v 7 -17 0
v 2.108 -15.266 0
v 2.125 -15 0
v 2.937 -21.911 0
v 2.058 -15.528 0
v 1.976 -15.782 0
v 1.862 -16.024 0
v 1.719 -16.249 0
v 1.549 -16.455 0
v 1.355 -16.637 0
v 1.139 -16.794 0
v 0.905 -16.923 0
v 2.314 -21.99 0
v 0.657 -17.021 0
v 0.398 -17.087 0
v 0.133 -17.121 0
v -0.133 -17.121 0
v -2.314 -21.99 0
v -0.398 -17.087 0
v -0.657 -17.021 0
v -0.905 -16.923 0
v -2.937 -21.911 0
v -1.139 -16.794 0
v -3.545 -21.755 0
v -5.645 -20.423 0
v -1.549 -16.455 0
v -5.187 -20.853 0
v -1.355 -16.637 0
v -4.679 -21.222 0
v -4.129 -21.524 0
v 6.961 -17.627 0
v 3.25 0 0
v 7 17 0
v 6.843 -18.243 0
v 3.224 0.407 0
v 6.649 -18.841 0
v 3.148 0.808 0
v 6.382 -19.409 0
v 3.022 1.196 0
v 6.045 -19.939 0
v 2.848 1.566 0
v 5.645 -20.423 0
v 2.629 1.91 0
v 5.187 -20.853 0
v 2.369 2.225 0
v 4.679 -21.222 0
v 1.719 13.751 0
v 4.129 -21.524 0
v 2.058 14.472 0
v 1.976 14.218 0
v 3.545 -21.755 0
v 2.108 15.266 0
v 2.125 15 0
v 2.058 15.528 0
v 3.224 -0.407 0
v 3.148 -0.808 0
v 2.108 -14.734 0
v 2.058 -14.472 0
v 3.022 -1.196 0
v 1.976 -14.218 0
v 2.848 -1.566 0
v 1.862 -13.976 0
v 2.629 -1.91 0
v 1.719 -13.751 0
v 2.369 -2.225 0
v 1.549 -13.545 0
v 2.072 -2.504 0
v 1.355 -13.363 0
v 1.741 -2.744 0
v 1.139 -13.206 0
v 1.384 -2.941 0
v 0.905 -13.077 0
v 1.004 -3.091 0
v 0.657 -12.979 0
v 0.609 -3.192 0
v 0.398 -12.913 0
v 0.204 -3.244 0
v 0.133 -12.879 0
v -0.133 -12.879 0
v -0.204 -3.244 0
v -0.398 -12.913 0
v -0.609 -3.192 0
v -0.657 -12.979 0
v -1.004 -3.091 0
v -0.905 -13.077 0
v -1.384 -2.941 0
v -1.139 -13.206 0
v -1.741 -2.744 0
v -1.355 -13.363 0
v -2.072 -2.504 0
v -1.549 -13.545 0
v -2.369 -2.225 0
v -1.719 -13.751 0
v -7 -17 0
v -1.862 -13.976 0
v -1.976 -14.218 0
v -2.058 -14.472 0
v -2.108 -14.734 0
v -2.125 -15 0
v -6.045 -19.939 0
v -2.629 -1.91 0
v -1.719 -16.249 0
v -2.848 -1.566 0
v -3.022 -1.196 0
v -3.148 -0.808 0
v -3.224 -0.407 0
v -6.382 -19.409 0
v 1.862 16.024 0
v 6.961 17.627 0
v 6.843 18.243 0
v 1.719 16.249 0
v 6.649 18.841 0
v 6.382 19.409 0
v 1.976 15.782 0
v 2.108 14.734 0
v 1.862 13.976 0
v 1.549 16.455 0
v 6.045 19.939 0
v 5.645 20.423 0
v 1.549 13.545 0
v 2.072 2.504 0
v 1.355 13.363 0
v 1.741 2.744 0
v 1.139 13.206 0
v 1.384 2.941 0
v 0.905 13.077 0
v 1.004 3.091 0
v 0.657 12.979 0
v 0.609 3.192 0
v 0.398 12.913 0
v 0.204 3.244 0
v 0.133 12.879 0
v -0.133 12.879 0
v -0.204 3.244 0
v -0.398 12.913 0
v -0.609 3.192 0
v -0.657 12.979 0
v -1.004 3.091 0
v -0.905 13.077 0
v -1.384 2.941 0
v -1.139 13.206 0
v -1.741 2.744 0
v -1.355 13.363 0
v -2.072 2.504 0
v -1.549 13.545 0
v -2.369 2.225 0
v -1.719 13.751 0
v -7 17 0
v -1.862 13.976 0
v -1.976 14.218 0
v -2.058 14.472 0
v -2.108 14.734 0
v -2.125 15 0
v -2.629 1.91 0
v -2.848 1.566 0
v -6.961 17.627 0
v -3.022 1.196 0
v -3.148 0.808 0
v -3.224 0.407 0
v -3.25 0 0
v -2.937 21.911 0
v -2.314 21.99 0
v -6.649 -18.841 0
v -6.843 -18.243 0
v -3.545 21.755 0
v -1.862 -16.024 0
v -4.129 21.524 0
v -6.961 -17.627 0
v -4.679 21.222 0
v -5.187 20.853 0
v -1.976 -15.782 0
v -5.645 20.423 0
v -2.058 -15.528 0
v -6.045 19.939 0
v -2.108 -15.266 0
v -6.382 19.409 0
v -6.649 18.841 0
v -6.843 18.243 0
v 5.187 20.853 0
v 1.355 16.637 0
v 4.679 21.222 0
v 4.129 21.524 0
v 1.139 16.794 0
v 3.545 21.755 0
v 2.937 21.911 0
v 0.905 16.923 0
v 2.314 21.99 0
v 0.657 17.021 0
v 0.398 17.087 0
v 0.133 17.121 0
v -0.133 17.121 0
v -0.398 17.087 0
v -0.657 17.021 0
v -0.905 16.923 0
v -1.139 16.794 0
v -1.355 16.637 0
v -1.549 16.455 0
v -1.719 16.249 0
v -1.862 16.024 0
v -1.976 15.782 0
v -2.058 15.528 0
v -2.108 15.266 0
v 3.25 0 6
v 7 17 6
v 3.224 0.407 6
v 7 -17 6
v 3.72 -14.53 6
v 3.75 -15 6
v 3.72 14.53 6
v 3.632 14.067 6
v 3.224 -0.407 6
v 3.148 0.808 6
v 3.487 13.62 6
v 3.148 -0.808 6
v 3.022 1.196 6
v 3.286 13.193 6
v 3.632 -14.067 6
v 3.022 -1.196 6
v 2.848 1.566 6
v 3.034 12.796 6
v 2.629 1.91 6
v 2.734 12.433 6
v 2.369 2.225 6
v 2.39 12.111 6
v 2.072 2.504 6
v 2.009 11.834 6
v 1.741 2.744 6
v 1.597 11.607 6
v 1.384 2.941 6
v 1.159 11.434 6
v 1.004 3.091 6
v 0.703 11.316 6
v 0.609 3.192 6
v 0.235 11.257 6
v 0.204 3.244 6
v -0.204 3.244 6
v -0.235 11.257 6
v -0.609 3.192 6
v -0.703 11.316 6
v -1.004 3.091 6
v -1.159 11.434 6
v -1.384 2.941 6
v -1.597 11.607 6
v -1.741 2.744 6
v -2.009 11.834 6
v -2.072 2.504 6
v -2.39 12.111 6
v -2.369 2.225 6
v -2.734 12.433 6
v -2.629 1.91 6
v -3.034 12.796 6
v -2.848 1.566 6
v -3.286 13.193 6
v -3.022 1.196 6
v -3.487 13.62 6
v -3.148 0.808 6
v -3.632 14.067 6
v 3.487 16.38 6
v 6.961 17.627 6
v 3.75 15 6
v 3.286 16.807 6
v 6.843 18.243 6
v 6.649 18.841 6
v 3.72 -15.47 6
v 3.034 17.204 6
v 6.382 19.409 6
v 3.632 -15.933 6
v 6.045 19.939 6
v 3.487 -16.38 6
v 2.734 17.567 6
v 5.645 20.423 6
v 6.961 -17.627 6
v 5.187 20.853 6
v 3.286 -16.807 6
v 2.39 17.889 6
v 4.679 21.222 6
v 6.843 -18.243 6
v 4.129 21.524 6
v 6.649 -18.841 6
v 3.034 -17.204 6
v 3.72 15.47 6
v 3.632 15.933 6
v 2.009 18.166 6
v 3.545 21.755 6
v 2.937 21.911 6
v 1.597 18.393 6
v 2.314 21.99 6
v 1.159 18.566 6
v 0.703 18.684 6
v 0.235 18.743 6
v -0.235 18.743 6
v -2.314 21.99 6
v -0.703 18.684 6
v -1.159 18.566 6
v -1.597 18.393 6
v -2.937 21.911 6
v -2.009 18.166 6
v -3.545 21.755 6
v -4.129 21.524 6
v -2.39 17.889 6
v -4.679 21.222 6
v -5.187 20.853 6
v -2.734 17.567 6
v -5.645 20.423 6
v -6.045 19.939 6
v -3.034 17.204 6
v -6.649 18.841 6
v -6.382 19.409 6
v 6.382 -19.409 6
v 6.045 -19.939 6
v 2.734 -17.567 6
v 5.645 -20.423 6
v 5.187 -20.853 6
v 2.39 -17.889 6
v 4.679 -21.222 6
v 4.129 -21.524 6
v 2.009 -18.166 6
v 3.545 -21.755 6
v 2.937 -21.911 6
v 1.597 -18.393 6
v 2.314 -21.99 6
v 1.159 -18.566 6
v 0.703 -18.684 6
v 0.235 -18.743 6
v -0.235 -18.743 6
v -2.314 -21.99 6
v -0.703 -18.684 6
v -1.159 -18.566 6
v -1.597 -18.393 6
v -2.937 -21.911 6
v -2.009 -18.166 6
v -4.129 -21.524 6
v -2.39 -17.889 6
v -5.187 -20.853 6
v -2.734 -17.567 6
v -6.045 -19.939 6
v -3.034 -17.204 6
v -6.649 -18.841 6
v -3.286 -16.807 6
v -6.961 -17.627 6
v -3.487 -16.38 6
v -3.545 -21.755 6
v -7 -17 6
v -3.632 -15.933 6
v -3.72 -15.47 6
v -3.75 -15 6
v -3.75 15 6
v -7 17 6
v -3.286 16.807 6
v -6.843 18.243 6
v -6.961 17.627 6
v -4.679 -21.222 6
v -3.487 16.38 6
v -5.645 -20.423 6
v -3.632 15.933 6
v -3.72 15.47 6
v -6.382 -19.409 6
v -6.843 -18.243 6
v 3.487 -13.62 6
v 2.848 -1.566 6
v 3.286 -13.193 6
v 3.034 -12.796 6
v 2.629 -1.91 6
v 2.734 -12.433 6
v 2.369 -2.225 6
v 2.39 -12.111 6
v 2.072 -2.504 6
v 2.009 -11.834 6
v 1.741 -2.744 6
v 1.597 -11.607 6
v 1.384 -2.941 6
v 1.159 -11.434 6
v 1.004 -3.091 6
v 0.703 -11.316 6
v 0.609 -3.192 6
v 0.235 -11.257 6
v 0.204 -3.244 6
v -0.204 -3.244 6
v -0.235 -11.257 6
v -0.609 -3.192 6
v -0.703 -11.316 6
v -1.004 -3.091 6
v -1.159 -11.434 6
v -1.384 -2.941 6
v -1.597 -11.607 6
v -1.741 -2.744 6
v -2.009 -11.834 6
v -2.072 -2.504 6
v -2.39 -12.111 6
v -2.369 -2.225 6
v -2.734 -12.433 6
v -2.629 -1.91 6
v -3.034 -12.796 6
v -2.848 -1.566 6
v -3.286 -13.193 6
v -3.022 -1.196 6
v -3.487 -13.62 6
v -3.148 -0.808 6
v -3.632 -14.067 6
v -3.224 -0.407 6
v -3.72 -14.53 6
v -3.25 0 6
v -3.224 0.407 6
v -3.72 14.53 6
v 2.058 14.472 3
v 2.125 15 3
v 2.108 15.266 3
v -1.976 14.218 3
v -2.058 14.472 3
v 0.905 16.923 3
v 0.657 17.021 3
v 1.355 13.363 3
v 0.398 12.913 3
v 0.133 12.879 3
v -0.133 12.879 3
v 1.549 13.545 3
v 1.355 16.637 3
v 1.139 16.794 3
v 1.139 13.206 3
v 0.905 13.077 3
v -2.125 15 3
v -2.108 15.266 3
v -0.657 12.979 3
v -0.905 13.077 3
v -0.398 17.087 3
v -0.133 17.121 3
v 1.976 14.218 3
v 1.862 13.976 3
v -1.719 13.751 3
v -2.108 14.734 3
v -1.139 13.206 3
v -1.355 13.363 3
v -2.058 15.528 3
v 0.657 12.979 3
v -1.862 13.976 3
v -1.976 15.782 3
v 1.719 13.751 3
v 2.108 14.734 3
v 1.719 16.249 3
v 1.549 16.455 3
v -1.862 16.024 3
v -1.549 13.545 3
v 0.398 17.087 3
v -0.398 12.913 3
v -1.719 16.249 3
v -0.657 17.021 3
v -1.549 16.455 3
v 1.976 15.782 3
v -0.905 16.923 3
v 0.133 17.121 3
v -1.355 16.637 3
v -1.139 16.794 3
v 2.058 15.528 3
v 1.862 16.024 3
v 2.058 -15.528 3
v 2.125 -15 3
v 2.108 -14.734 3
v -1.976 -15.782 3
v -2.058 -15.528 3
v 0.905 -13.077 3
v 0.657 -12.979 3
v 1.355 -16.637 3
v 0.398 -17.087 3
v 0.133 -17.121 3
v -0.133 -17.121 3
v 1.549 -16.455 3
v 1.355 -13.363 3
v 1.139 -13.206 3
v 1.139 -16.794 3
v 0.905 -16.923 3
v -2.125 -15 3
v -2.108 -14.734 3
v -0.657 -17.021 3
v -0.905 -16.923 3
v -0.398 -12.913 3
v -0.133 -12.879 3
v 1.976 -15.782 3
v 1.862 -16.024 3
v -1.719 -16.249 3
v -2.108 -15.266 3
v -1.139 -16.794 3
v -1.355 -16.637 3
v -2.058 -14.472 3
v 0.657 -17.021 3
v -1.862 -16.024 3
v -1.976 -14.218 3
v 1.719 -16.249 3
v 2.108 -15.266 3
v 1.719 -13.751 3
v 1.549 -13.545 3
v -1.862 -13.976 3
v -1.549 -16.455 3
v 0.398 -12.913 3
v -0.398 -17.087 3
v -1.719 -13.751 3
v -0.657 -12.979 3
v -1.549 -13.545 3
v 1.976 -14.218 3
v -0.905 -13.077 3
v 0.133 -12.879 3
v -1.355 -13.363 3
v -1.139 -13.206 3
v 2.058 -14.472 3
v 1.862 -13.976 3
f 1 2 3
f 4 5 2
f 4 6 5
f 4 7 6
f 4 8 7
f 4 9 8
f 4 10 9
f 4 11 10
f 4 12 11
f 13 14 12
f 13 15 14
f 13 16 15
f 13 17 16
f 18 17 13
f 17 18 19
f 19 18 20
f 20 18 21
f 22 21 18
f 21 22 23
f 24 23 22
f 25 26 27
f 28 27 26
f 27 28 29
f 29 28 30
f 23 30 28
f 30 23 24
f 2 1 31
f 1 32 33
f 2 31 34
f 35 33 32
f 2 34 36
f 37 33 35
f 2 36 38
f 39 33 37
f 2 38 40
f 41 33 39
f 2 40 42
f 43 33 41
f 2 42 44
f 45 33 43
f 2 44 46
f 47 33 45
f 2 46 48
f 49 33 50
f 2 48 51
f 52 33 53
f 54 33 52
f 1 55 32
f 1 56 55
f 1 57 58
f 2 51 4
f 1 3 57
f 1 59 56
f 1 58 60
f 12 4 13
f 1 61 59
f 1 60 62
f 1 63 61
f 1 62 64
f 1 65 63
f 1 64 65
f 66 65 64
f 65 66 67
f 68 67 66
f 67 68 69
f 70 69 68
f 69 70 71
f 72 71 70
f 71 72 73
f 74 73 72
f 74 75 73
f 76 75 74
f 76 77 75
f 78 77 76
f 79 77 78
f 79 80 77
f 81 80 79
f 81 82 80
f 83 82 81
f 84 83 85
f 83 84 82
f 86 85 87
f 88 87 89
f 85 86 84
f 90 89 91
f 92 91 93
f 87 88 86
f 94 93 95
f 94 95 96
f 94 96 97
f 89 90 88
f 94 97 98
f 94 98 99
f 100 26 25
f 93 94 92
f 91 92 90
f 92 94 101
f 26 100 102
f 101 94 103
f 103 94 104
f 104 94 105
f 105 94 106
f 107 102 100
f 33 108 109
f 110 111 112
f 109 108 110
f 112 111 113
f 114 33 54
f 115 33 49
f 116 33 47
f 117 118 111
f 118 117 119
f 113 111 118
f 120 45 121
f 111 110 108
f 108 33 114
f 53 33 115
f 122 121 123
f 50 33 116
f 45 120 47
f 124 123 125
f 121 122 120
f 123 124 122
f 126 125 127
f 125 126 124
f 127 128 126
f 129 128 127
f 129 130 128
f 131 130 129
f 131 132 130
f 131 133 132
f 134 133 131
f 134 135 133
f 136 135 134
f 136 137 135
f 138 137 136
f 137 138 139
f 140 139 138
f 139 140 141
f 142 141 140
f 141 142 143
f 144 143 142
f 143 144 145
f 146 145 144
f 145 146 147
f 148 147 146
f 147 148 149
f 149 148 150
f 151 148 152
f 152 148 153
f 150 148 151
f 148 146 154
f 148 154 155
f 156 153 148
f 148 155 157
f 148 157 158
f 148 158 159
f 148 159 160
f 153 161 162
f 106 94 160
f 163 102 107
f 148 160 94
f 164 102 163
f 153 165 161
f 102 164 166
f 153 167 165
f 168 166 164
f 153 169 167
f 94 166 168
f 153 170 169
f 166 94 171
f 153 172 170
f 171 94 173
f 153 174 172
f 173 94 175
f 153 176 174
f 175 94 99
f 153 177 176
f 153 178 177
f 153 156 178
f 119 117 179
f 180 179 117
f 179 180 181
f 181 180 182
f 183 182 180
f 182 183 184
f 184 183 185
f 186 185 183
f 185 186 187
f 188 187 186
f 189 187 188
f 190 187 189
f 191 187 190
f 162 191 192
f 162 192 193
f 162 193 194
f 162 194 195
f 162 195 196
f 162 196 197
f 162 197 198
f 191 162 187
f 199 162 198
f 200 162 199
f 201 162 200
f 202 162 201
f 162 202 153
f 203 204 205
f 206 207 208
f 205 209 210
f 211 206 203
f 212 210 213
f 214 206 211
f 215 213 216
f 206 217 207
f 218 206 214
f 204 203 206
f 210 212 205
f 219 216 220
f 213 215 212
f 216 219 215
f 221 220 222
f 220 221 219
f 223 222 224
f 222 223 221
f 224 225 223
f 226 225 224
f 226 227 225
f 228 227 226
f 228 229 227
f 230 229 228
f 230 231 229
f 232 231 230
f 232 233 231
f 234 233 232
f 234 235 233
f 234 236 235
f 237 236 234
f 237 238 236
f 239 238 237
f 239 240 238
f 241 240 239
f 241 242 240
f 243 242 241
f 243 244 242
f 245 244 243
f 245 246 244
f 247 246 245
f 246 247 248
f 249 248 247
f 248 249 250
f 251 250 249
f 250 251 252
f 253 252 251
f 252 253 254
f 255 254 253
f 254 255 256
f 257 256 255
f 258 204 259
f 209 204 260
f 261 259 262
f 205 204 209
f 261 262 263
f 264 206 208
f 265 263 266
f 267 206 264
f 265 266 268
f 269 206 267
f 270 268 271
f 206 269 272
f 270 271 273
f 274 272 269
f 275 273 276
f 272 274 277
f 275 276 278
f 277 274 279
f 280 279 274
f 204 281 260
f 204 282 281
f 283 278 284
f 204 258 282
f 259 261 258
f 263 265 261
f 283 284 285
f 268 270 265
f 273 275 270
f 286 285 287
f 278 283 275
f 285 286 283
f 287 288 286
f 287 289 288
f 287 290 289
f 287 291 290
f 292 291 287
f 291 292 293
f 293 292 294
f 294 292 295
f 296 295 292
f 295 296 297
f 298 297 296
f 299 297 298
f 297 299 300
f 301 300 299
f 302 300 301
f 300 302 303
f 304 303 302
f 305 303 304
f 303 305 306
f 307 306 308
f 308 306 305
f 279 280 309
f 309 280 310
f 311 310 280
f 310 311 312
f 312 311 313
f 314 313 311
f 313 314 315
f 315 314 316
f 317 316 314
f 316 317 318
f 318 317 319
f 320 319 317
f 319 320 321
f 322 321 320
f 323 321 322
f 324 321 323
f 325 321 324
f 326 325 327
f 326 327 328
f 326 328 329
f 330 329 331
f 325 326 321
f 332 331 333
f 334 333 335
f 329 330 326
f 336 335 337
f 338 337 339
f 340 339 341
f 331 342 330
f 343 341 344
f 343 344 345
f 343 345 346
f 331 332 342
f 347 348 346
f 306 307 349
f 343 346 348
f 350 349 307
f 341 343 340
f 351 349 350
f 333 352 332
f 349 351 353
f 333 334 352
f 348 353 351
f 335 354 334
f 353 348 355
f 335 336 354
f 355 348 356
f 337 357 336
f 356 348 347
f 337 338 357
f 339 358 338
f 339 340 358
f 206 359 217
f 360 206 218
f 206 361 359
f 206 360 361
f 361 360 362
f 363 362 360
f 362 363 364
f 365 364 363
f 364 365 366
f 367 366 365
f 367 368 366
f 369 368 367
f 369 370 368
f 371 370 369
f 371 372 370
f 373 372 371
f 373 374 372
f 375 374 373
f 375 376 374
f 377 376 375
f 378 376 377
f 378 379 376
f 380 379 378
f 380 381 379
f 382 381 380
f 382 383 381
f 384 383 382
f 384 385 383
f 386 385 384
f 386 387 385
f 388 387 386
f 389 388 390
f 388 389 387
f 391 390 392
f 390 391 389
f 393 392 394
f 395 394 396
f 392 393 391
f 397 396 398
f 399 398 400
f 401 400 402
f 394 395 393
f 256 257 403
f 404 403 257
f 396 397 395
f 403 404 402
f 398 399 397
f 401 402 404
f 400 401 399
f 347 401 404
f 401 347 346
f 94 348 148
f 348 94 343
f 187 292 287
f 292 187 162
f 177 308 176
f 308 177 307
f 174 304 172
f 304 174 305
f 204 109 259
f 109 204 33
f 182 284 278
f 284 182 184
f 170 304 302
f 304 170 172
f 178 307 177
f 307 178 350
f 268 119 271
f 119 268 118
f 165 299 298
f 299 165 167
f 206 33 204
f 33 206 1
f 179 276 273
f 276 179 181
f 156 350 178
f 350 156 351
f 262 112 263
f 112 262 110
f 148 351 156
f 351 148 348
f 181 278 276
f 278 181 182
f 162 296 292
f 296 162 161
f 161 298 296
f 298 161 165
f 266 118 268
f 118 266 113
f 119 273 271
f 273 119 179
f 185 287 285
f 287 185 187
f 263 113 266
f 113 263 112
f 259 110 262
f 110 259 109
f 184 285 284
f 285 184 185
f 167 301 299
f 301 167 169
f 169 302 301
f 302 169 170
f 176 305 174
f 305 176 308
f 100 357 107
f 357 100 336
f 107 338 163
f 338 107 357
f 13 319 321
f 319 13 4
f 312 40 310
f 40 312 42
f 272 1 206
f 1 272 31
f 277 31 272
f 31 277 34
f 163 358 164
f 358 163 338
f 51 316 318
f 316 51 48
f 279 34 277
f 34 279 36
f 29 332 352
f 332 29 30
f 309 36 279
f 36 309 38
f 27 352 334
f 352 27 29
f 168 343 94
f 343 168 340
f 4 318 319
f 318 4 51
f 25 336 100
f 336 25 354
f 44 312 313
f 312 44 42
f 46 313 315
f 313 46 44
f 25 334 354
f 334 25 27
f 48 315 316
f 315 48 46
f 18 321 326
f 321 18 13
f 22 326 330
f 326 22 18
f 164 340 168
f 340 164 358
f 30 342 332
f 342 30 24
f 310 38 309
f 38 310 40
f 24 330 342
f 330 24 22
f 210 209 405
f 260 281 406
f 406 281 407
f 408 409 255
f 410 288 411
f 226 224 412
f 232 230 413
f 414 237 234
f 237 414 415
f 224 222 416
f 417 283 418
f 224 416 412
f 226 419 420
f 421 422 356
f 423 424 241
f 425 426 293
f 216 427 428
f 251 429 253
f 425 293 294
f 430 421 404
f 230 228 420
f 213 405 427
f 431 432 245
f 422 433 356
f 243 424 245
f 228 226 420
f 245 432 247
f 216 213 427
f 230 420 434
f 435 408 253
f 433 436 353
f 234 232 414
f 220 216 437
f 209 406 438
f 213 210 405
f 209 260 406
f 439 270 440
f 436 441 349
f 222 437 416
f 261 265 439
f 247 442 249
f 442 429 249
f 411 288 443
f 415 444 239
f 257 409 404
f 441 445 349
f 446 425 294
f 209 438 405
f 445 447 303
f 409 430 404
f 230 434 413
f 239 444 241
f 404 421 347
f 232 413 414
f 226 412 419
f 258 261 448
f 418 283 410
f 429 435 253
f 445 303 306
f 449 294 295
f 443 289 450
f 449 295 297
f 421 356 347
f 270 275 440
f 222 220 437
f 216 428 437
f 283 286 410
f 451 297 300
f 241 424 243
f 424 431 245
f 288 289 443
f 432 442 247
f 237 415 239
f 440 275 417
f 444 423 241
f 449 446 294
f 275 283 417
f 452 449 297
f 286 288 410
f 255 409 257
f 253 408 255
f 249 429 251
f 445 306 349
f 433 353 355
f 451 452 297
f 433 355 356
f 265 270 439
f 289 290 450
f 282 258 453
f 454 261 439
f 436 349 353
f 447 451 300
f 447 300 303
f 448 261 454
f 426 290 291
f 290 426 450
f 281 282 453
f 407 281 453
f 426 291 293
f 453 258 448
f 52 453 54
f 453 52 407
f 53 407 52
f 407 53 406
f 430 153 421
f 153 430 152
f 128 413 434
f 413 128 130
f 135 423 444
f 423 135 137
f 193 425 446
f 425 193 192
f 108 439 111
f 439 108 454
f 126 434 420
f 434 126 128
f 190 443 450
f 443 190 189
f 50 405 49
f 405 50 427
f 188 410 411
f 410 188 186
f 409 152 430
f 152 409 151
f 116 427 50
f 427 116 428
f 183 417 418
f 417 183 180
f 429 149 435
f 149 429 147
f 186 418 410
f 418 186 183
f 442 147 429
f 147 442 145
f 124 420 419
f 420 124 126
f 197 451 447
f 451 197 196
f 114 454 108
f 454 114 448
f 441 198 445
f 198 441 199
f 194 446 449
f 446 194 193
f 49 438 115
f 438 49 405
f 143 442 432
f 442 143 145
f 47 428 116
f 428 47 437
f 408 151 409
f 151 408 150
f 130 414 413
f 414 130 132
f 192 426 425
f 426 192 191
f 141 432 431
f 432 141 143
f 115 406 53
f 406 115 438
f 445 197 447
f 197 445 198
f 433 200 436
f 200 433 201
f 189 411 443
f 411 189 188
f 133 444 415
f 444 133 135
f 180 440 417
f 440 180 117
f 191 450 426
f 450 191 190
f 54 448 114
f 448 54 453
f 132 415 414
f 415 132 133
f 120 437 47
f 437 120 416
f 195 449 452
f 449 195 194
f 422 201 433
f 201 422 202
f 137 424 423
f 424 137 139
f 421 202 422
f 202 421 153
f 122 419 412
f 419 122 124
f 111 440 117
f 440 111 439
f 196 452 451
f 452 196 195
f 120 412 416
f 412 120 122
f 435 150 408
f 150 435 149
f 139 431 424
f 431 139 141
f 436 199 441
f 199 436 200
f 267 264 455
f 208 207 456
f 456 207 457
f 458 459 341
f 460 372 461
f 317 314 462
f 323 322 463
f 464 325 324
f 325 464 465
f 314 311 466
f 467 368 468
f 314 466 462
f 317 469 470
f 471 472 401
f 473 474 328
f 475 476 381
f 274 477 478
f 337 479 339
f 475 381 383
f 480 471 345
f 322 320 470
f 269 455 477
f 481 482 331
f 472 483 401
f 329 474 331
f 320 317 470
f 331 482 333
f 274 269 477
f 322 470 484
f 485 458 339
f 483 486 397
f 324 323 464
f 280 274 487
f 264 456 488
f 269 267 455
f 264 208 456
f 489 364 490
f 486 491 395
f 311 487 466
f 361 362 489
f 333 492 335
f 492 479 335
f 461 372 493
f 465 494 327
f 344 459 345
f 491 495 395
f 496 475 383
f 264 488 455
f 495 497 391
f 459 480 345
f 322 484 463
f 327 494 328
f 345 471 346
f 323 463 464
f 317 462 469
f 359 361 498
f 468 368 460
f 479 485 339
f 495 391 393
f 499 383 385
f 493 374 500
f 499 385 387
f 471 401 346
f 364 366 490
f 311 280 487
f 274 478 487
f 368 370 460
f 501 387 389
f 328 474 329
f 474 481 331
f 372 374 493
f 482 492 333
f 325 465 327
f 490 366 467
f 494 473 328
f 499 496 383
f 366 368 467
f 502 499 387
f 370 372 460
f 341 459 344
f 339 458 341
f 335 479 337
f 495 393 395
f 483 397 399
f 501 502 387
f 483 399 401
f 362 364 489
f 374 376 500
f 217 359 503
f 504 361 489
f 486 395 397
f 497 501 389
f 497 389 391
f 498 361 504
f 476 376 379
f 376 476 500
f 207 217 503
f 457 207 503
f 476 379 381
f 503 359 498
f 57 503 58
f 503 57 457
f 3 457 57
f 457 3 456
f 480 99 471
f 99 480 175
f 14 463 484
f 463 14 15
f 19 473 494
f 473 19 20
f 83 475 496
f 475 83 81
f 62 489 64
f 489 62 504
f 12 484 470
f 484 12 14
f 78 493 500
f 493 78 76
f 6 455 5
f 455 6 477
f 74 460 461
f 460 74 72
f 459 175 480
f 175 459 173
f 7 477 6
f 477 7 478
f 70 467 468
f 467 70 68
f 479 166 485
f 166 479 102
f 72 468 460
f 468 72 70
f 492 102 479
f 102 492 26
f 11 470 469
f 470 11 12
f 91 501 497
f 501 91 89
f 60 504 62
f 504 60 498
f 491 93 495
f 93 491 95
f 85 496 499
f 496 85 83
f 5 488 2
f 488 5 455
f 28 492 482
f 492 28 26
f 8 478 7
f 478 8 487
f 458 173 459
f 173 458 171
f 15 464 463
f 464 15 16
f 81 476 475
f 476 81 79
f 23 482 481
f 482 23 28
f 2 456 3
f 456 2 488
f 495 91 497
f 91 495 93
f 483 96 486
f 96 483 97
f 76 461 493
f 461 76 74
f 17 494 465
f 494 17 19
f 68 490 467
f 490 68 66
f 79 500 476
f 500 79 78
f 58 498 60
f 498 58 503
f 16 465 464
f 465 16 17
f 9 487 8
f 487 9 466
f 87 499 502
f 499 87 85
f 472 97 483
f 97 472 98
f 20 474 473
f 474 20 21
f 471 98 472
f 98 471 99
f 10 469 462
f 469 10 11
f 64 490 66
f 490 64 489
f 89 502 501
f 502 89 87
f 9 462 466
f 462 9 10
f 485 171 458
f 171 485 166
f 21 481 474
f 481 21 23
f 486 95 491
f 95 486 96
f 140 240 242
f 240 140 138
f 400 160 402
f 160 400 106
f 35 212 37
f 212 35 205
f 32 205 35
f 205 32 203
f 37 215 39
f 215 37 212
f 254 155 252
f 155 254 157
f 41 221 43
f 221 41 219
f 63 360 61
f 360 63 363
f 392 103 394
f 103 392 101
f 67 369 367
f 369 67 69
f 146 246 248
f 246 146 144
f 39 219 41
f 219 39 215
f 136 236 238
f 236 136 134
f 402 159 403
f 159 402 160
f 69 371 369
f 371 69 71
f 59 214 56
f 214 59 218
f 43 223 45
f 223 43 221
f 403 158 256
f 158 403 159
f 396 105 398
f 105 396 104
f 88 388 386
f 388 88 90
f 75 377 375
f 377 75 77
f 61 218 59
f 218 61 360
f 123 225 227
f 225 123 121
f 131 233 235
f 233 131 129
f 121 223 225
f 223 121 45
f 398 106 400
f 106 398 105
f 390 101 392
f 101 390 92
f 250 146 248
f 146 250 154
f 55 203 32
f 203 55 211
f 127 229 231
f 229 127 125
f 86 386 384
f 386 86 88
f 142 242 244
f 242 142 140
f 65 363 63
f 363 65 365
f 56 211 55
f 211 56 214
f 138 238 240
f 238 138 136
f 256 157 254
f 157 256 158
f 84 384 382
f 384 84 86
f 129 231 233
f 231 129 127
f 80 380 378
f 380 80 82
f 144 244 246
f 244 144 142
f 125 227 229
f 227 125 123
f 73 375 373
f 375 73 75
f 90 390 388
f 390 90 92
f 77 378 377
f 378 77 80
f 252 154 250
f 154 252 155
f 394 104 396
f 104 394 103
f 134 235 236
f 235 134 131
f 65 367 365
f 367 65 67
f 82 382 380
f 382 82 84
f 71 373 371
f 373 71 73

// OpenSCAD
$fn = 50;


difference() {
	union() {
		cylinder(h = 6, r = 7.0000000000);
		translate(v = [0.0000000000, 7.5000000000, 0]) {
			hull() {
				translate(v = [-2.0000000000, 9.5000000000, 0]) {
					cylinder(h = 6, r = 5);
				}
				translate(v = [2.0000000000, 9.5000000000, 0]) {
					cylinder(h = 6, r = 5);
				}
				translate(v = [-2.0000000000, -9.5000000000, 0]) {
					cylinder(h = 6, r = 5);
				}
				translate(v = [2.0000000000, -9.5000000000, 0]) {
					cylinder(h = 6, r = 5);
				}
			}
		}
		translate(v = [0.0000000000, 7.5000000000, 0]) {
			hull() {
				translate(v = [-2.0000000000, 9.5000000000, 0]) {
					cylinder(h = 6, r = 5);
				}
				translate(v = [2.0000000000, 9.5000000000, 0]) {
					cylinder(h = 6, r = 5);
				}
				translate(v = [-2.0000000000, -9.5000000000, 0]) {
					cylinder(h = 6, r = 5);
				}
				translate(v = [2.0000000000, -9.5000000000, 0]) {
					cylinder(h = 6, r = 5);
				}
			}
		}
		translate(v = [0.0000000000, -7.5000000000, 0]) {
			hull() {
				translate(v = [-2.0000000000, 9.5000000000, 0]) {
					cylinder(h = 6, r = 5);
				}
				translate(v = [2.0000000000, 9.5000000000, 0]) {
					cylinder(h = 6, r = 5);
				}
				translate(v = [-2.0000000000, -9.5000000000, 0]) {
					cylinder(h = 6, r = 5);
				}
				translate(v = [2.0000000000, -9.5000000000, 0]) {
					cylinder(h = 6, r = 5);
				}
			}
		}
		translate(v = [0.0000000000, -7.5000000000, 0]) {
			hull() {
				translate(v = [-2.0000000000, 9.5000000000, 0]) {
					cylinder(h = 6, r = 5);
				}
				translate(v = [2.0000000000, 9.5000000000, 0]) {
					cylinder(h = 6, r = 5);
				}
				translate(v = [-2.0000000000, -9.5000000000, 0]) {
					cylinder(h = 6, r = 5);
				}
				translate(v = [2.0000000000, -9.5000000000, 0]) {
					cylinder(h = 6, r = 5);
				}
			}
		}
	}
	union() {
		translate(v = [0.0000000000, 15.0000000000, 6]) {
			rotate(a = [0, 0, 0]) {
				difference() {
					union() {
						#translate(v = [0, 0, -6.0000000000]) {
							cylinder(h = 6, r = 2.0000000000);
						}
						#translate(v = [0, 0, -3]) {
							cylinder(h = 3, r1 = 2.1250000000, r2 = 3.7500000000);
						}
						#translate(v = [0, 0, -6.0000000000]) {
							cylinder(h = 6, r = 2.1250000000);
						}
						#translate(v = [0, 0, -6.0000000000]) {
							cylinder(h = 6, r = 2.0000000000);
						}
					}
					union();
				}
			}
		}
		translate(v = [0.0000000000, 15.0000000000, 6]) {
			rotate(a = [0, 0, 0]) {
				difference() {
					union() {
						#translate(v = [0, 0, -6.0000000000]) {
							cylinder(h = 6, r = 2.0000000000);
						}
						#translate(v = [0, 0, -3]) {
							cylinder(h = 3, r1 = 2.1250000000, r2 = 3.7500000000);
						}
						#translate(v = [0, 0, -6.0000000000]) {
							cylinder(h = 6, r = 2.1250000000);
						}
						#translate(v = [0, 0, -6.0000000000]) {
							cylinder(h = 6, r = 2.0000000000);
						}
					}
					union();
				}
			}
		}
		translate(v = [0.0000000000, -15.0000000000, 6]) {
			rotate(a = [0, 0, 0]) {
				difference() {
					union() {
						#translate(v = [0, 0, -6.0000000000]) {
							cylinder(h = 6, r = 2.0000000000);
						}
						#translate(v = [0, 0, -3]) {
							cylinder(h = 3, r1 = 2.1250000000, r2 = 3.7500000000);
						}
						#translate(v = [0, 0, -6.0000000000]) {
							cylinder(h = 6, r = 2.1250000000);
						}
						#translate(v = [0, 0, -6.0000000000]) {
							cylinder(h = 6, r = 2.0000000000);
						}
					}
					union();
				}
			}
		}
		translate(v = [0.0000000000, -15.0000000000, 6]) {
			rotate(a = [0, 0, 0]) {
				difference() {
					union() {
						#translate(v = [0, 0, -6.0000000000]) {
							cylinder(h = 6, r = 2.0000000000);
						}
						#translate(v = [0, 0, -3]) {
							cylinder(h = 3, r1 = 2.1250000000, r2 = 3.7500000000);
						}
						#translate(v = [0, 0, -6.0000000000]) {
							cylinder(h = 6, r = 2.1250000000);
						}
						#translate(v = [0, 0, -6.0000000000]) {
							cylinder(h = 6, r = 2.0000000000);
						}
					}
					union();
				}
			}
		}
		translate(v = [0, 0, -100]) {
			cylinder(h = 200, r = 3.2500000000);
		}
		translate(v = [0, 0, -100]) {
			cylinder(h = 200, r = 1.8000000000);
		}
	}
}
